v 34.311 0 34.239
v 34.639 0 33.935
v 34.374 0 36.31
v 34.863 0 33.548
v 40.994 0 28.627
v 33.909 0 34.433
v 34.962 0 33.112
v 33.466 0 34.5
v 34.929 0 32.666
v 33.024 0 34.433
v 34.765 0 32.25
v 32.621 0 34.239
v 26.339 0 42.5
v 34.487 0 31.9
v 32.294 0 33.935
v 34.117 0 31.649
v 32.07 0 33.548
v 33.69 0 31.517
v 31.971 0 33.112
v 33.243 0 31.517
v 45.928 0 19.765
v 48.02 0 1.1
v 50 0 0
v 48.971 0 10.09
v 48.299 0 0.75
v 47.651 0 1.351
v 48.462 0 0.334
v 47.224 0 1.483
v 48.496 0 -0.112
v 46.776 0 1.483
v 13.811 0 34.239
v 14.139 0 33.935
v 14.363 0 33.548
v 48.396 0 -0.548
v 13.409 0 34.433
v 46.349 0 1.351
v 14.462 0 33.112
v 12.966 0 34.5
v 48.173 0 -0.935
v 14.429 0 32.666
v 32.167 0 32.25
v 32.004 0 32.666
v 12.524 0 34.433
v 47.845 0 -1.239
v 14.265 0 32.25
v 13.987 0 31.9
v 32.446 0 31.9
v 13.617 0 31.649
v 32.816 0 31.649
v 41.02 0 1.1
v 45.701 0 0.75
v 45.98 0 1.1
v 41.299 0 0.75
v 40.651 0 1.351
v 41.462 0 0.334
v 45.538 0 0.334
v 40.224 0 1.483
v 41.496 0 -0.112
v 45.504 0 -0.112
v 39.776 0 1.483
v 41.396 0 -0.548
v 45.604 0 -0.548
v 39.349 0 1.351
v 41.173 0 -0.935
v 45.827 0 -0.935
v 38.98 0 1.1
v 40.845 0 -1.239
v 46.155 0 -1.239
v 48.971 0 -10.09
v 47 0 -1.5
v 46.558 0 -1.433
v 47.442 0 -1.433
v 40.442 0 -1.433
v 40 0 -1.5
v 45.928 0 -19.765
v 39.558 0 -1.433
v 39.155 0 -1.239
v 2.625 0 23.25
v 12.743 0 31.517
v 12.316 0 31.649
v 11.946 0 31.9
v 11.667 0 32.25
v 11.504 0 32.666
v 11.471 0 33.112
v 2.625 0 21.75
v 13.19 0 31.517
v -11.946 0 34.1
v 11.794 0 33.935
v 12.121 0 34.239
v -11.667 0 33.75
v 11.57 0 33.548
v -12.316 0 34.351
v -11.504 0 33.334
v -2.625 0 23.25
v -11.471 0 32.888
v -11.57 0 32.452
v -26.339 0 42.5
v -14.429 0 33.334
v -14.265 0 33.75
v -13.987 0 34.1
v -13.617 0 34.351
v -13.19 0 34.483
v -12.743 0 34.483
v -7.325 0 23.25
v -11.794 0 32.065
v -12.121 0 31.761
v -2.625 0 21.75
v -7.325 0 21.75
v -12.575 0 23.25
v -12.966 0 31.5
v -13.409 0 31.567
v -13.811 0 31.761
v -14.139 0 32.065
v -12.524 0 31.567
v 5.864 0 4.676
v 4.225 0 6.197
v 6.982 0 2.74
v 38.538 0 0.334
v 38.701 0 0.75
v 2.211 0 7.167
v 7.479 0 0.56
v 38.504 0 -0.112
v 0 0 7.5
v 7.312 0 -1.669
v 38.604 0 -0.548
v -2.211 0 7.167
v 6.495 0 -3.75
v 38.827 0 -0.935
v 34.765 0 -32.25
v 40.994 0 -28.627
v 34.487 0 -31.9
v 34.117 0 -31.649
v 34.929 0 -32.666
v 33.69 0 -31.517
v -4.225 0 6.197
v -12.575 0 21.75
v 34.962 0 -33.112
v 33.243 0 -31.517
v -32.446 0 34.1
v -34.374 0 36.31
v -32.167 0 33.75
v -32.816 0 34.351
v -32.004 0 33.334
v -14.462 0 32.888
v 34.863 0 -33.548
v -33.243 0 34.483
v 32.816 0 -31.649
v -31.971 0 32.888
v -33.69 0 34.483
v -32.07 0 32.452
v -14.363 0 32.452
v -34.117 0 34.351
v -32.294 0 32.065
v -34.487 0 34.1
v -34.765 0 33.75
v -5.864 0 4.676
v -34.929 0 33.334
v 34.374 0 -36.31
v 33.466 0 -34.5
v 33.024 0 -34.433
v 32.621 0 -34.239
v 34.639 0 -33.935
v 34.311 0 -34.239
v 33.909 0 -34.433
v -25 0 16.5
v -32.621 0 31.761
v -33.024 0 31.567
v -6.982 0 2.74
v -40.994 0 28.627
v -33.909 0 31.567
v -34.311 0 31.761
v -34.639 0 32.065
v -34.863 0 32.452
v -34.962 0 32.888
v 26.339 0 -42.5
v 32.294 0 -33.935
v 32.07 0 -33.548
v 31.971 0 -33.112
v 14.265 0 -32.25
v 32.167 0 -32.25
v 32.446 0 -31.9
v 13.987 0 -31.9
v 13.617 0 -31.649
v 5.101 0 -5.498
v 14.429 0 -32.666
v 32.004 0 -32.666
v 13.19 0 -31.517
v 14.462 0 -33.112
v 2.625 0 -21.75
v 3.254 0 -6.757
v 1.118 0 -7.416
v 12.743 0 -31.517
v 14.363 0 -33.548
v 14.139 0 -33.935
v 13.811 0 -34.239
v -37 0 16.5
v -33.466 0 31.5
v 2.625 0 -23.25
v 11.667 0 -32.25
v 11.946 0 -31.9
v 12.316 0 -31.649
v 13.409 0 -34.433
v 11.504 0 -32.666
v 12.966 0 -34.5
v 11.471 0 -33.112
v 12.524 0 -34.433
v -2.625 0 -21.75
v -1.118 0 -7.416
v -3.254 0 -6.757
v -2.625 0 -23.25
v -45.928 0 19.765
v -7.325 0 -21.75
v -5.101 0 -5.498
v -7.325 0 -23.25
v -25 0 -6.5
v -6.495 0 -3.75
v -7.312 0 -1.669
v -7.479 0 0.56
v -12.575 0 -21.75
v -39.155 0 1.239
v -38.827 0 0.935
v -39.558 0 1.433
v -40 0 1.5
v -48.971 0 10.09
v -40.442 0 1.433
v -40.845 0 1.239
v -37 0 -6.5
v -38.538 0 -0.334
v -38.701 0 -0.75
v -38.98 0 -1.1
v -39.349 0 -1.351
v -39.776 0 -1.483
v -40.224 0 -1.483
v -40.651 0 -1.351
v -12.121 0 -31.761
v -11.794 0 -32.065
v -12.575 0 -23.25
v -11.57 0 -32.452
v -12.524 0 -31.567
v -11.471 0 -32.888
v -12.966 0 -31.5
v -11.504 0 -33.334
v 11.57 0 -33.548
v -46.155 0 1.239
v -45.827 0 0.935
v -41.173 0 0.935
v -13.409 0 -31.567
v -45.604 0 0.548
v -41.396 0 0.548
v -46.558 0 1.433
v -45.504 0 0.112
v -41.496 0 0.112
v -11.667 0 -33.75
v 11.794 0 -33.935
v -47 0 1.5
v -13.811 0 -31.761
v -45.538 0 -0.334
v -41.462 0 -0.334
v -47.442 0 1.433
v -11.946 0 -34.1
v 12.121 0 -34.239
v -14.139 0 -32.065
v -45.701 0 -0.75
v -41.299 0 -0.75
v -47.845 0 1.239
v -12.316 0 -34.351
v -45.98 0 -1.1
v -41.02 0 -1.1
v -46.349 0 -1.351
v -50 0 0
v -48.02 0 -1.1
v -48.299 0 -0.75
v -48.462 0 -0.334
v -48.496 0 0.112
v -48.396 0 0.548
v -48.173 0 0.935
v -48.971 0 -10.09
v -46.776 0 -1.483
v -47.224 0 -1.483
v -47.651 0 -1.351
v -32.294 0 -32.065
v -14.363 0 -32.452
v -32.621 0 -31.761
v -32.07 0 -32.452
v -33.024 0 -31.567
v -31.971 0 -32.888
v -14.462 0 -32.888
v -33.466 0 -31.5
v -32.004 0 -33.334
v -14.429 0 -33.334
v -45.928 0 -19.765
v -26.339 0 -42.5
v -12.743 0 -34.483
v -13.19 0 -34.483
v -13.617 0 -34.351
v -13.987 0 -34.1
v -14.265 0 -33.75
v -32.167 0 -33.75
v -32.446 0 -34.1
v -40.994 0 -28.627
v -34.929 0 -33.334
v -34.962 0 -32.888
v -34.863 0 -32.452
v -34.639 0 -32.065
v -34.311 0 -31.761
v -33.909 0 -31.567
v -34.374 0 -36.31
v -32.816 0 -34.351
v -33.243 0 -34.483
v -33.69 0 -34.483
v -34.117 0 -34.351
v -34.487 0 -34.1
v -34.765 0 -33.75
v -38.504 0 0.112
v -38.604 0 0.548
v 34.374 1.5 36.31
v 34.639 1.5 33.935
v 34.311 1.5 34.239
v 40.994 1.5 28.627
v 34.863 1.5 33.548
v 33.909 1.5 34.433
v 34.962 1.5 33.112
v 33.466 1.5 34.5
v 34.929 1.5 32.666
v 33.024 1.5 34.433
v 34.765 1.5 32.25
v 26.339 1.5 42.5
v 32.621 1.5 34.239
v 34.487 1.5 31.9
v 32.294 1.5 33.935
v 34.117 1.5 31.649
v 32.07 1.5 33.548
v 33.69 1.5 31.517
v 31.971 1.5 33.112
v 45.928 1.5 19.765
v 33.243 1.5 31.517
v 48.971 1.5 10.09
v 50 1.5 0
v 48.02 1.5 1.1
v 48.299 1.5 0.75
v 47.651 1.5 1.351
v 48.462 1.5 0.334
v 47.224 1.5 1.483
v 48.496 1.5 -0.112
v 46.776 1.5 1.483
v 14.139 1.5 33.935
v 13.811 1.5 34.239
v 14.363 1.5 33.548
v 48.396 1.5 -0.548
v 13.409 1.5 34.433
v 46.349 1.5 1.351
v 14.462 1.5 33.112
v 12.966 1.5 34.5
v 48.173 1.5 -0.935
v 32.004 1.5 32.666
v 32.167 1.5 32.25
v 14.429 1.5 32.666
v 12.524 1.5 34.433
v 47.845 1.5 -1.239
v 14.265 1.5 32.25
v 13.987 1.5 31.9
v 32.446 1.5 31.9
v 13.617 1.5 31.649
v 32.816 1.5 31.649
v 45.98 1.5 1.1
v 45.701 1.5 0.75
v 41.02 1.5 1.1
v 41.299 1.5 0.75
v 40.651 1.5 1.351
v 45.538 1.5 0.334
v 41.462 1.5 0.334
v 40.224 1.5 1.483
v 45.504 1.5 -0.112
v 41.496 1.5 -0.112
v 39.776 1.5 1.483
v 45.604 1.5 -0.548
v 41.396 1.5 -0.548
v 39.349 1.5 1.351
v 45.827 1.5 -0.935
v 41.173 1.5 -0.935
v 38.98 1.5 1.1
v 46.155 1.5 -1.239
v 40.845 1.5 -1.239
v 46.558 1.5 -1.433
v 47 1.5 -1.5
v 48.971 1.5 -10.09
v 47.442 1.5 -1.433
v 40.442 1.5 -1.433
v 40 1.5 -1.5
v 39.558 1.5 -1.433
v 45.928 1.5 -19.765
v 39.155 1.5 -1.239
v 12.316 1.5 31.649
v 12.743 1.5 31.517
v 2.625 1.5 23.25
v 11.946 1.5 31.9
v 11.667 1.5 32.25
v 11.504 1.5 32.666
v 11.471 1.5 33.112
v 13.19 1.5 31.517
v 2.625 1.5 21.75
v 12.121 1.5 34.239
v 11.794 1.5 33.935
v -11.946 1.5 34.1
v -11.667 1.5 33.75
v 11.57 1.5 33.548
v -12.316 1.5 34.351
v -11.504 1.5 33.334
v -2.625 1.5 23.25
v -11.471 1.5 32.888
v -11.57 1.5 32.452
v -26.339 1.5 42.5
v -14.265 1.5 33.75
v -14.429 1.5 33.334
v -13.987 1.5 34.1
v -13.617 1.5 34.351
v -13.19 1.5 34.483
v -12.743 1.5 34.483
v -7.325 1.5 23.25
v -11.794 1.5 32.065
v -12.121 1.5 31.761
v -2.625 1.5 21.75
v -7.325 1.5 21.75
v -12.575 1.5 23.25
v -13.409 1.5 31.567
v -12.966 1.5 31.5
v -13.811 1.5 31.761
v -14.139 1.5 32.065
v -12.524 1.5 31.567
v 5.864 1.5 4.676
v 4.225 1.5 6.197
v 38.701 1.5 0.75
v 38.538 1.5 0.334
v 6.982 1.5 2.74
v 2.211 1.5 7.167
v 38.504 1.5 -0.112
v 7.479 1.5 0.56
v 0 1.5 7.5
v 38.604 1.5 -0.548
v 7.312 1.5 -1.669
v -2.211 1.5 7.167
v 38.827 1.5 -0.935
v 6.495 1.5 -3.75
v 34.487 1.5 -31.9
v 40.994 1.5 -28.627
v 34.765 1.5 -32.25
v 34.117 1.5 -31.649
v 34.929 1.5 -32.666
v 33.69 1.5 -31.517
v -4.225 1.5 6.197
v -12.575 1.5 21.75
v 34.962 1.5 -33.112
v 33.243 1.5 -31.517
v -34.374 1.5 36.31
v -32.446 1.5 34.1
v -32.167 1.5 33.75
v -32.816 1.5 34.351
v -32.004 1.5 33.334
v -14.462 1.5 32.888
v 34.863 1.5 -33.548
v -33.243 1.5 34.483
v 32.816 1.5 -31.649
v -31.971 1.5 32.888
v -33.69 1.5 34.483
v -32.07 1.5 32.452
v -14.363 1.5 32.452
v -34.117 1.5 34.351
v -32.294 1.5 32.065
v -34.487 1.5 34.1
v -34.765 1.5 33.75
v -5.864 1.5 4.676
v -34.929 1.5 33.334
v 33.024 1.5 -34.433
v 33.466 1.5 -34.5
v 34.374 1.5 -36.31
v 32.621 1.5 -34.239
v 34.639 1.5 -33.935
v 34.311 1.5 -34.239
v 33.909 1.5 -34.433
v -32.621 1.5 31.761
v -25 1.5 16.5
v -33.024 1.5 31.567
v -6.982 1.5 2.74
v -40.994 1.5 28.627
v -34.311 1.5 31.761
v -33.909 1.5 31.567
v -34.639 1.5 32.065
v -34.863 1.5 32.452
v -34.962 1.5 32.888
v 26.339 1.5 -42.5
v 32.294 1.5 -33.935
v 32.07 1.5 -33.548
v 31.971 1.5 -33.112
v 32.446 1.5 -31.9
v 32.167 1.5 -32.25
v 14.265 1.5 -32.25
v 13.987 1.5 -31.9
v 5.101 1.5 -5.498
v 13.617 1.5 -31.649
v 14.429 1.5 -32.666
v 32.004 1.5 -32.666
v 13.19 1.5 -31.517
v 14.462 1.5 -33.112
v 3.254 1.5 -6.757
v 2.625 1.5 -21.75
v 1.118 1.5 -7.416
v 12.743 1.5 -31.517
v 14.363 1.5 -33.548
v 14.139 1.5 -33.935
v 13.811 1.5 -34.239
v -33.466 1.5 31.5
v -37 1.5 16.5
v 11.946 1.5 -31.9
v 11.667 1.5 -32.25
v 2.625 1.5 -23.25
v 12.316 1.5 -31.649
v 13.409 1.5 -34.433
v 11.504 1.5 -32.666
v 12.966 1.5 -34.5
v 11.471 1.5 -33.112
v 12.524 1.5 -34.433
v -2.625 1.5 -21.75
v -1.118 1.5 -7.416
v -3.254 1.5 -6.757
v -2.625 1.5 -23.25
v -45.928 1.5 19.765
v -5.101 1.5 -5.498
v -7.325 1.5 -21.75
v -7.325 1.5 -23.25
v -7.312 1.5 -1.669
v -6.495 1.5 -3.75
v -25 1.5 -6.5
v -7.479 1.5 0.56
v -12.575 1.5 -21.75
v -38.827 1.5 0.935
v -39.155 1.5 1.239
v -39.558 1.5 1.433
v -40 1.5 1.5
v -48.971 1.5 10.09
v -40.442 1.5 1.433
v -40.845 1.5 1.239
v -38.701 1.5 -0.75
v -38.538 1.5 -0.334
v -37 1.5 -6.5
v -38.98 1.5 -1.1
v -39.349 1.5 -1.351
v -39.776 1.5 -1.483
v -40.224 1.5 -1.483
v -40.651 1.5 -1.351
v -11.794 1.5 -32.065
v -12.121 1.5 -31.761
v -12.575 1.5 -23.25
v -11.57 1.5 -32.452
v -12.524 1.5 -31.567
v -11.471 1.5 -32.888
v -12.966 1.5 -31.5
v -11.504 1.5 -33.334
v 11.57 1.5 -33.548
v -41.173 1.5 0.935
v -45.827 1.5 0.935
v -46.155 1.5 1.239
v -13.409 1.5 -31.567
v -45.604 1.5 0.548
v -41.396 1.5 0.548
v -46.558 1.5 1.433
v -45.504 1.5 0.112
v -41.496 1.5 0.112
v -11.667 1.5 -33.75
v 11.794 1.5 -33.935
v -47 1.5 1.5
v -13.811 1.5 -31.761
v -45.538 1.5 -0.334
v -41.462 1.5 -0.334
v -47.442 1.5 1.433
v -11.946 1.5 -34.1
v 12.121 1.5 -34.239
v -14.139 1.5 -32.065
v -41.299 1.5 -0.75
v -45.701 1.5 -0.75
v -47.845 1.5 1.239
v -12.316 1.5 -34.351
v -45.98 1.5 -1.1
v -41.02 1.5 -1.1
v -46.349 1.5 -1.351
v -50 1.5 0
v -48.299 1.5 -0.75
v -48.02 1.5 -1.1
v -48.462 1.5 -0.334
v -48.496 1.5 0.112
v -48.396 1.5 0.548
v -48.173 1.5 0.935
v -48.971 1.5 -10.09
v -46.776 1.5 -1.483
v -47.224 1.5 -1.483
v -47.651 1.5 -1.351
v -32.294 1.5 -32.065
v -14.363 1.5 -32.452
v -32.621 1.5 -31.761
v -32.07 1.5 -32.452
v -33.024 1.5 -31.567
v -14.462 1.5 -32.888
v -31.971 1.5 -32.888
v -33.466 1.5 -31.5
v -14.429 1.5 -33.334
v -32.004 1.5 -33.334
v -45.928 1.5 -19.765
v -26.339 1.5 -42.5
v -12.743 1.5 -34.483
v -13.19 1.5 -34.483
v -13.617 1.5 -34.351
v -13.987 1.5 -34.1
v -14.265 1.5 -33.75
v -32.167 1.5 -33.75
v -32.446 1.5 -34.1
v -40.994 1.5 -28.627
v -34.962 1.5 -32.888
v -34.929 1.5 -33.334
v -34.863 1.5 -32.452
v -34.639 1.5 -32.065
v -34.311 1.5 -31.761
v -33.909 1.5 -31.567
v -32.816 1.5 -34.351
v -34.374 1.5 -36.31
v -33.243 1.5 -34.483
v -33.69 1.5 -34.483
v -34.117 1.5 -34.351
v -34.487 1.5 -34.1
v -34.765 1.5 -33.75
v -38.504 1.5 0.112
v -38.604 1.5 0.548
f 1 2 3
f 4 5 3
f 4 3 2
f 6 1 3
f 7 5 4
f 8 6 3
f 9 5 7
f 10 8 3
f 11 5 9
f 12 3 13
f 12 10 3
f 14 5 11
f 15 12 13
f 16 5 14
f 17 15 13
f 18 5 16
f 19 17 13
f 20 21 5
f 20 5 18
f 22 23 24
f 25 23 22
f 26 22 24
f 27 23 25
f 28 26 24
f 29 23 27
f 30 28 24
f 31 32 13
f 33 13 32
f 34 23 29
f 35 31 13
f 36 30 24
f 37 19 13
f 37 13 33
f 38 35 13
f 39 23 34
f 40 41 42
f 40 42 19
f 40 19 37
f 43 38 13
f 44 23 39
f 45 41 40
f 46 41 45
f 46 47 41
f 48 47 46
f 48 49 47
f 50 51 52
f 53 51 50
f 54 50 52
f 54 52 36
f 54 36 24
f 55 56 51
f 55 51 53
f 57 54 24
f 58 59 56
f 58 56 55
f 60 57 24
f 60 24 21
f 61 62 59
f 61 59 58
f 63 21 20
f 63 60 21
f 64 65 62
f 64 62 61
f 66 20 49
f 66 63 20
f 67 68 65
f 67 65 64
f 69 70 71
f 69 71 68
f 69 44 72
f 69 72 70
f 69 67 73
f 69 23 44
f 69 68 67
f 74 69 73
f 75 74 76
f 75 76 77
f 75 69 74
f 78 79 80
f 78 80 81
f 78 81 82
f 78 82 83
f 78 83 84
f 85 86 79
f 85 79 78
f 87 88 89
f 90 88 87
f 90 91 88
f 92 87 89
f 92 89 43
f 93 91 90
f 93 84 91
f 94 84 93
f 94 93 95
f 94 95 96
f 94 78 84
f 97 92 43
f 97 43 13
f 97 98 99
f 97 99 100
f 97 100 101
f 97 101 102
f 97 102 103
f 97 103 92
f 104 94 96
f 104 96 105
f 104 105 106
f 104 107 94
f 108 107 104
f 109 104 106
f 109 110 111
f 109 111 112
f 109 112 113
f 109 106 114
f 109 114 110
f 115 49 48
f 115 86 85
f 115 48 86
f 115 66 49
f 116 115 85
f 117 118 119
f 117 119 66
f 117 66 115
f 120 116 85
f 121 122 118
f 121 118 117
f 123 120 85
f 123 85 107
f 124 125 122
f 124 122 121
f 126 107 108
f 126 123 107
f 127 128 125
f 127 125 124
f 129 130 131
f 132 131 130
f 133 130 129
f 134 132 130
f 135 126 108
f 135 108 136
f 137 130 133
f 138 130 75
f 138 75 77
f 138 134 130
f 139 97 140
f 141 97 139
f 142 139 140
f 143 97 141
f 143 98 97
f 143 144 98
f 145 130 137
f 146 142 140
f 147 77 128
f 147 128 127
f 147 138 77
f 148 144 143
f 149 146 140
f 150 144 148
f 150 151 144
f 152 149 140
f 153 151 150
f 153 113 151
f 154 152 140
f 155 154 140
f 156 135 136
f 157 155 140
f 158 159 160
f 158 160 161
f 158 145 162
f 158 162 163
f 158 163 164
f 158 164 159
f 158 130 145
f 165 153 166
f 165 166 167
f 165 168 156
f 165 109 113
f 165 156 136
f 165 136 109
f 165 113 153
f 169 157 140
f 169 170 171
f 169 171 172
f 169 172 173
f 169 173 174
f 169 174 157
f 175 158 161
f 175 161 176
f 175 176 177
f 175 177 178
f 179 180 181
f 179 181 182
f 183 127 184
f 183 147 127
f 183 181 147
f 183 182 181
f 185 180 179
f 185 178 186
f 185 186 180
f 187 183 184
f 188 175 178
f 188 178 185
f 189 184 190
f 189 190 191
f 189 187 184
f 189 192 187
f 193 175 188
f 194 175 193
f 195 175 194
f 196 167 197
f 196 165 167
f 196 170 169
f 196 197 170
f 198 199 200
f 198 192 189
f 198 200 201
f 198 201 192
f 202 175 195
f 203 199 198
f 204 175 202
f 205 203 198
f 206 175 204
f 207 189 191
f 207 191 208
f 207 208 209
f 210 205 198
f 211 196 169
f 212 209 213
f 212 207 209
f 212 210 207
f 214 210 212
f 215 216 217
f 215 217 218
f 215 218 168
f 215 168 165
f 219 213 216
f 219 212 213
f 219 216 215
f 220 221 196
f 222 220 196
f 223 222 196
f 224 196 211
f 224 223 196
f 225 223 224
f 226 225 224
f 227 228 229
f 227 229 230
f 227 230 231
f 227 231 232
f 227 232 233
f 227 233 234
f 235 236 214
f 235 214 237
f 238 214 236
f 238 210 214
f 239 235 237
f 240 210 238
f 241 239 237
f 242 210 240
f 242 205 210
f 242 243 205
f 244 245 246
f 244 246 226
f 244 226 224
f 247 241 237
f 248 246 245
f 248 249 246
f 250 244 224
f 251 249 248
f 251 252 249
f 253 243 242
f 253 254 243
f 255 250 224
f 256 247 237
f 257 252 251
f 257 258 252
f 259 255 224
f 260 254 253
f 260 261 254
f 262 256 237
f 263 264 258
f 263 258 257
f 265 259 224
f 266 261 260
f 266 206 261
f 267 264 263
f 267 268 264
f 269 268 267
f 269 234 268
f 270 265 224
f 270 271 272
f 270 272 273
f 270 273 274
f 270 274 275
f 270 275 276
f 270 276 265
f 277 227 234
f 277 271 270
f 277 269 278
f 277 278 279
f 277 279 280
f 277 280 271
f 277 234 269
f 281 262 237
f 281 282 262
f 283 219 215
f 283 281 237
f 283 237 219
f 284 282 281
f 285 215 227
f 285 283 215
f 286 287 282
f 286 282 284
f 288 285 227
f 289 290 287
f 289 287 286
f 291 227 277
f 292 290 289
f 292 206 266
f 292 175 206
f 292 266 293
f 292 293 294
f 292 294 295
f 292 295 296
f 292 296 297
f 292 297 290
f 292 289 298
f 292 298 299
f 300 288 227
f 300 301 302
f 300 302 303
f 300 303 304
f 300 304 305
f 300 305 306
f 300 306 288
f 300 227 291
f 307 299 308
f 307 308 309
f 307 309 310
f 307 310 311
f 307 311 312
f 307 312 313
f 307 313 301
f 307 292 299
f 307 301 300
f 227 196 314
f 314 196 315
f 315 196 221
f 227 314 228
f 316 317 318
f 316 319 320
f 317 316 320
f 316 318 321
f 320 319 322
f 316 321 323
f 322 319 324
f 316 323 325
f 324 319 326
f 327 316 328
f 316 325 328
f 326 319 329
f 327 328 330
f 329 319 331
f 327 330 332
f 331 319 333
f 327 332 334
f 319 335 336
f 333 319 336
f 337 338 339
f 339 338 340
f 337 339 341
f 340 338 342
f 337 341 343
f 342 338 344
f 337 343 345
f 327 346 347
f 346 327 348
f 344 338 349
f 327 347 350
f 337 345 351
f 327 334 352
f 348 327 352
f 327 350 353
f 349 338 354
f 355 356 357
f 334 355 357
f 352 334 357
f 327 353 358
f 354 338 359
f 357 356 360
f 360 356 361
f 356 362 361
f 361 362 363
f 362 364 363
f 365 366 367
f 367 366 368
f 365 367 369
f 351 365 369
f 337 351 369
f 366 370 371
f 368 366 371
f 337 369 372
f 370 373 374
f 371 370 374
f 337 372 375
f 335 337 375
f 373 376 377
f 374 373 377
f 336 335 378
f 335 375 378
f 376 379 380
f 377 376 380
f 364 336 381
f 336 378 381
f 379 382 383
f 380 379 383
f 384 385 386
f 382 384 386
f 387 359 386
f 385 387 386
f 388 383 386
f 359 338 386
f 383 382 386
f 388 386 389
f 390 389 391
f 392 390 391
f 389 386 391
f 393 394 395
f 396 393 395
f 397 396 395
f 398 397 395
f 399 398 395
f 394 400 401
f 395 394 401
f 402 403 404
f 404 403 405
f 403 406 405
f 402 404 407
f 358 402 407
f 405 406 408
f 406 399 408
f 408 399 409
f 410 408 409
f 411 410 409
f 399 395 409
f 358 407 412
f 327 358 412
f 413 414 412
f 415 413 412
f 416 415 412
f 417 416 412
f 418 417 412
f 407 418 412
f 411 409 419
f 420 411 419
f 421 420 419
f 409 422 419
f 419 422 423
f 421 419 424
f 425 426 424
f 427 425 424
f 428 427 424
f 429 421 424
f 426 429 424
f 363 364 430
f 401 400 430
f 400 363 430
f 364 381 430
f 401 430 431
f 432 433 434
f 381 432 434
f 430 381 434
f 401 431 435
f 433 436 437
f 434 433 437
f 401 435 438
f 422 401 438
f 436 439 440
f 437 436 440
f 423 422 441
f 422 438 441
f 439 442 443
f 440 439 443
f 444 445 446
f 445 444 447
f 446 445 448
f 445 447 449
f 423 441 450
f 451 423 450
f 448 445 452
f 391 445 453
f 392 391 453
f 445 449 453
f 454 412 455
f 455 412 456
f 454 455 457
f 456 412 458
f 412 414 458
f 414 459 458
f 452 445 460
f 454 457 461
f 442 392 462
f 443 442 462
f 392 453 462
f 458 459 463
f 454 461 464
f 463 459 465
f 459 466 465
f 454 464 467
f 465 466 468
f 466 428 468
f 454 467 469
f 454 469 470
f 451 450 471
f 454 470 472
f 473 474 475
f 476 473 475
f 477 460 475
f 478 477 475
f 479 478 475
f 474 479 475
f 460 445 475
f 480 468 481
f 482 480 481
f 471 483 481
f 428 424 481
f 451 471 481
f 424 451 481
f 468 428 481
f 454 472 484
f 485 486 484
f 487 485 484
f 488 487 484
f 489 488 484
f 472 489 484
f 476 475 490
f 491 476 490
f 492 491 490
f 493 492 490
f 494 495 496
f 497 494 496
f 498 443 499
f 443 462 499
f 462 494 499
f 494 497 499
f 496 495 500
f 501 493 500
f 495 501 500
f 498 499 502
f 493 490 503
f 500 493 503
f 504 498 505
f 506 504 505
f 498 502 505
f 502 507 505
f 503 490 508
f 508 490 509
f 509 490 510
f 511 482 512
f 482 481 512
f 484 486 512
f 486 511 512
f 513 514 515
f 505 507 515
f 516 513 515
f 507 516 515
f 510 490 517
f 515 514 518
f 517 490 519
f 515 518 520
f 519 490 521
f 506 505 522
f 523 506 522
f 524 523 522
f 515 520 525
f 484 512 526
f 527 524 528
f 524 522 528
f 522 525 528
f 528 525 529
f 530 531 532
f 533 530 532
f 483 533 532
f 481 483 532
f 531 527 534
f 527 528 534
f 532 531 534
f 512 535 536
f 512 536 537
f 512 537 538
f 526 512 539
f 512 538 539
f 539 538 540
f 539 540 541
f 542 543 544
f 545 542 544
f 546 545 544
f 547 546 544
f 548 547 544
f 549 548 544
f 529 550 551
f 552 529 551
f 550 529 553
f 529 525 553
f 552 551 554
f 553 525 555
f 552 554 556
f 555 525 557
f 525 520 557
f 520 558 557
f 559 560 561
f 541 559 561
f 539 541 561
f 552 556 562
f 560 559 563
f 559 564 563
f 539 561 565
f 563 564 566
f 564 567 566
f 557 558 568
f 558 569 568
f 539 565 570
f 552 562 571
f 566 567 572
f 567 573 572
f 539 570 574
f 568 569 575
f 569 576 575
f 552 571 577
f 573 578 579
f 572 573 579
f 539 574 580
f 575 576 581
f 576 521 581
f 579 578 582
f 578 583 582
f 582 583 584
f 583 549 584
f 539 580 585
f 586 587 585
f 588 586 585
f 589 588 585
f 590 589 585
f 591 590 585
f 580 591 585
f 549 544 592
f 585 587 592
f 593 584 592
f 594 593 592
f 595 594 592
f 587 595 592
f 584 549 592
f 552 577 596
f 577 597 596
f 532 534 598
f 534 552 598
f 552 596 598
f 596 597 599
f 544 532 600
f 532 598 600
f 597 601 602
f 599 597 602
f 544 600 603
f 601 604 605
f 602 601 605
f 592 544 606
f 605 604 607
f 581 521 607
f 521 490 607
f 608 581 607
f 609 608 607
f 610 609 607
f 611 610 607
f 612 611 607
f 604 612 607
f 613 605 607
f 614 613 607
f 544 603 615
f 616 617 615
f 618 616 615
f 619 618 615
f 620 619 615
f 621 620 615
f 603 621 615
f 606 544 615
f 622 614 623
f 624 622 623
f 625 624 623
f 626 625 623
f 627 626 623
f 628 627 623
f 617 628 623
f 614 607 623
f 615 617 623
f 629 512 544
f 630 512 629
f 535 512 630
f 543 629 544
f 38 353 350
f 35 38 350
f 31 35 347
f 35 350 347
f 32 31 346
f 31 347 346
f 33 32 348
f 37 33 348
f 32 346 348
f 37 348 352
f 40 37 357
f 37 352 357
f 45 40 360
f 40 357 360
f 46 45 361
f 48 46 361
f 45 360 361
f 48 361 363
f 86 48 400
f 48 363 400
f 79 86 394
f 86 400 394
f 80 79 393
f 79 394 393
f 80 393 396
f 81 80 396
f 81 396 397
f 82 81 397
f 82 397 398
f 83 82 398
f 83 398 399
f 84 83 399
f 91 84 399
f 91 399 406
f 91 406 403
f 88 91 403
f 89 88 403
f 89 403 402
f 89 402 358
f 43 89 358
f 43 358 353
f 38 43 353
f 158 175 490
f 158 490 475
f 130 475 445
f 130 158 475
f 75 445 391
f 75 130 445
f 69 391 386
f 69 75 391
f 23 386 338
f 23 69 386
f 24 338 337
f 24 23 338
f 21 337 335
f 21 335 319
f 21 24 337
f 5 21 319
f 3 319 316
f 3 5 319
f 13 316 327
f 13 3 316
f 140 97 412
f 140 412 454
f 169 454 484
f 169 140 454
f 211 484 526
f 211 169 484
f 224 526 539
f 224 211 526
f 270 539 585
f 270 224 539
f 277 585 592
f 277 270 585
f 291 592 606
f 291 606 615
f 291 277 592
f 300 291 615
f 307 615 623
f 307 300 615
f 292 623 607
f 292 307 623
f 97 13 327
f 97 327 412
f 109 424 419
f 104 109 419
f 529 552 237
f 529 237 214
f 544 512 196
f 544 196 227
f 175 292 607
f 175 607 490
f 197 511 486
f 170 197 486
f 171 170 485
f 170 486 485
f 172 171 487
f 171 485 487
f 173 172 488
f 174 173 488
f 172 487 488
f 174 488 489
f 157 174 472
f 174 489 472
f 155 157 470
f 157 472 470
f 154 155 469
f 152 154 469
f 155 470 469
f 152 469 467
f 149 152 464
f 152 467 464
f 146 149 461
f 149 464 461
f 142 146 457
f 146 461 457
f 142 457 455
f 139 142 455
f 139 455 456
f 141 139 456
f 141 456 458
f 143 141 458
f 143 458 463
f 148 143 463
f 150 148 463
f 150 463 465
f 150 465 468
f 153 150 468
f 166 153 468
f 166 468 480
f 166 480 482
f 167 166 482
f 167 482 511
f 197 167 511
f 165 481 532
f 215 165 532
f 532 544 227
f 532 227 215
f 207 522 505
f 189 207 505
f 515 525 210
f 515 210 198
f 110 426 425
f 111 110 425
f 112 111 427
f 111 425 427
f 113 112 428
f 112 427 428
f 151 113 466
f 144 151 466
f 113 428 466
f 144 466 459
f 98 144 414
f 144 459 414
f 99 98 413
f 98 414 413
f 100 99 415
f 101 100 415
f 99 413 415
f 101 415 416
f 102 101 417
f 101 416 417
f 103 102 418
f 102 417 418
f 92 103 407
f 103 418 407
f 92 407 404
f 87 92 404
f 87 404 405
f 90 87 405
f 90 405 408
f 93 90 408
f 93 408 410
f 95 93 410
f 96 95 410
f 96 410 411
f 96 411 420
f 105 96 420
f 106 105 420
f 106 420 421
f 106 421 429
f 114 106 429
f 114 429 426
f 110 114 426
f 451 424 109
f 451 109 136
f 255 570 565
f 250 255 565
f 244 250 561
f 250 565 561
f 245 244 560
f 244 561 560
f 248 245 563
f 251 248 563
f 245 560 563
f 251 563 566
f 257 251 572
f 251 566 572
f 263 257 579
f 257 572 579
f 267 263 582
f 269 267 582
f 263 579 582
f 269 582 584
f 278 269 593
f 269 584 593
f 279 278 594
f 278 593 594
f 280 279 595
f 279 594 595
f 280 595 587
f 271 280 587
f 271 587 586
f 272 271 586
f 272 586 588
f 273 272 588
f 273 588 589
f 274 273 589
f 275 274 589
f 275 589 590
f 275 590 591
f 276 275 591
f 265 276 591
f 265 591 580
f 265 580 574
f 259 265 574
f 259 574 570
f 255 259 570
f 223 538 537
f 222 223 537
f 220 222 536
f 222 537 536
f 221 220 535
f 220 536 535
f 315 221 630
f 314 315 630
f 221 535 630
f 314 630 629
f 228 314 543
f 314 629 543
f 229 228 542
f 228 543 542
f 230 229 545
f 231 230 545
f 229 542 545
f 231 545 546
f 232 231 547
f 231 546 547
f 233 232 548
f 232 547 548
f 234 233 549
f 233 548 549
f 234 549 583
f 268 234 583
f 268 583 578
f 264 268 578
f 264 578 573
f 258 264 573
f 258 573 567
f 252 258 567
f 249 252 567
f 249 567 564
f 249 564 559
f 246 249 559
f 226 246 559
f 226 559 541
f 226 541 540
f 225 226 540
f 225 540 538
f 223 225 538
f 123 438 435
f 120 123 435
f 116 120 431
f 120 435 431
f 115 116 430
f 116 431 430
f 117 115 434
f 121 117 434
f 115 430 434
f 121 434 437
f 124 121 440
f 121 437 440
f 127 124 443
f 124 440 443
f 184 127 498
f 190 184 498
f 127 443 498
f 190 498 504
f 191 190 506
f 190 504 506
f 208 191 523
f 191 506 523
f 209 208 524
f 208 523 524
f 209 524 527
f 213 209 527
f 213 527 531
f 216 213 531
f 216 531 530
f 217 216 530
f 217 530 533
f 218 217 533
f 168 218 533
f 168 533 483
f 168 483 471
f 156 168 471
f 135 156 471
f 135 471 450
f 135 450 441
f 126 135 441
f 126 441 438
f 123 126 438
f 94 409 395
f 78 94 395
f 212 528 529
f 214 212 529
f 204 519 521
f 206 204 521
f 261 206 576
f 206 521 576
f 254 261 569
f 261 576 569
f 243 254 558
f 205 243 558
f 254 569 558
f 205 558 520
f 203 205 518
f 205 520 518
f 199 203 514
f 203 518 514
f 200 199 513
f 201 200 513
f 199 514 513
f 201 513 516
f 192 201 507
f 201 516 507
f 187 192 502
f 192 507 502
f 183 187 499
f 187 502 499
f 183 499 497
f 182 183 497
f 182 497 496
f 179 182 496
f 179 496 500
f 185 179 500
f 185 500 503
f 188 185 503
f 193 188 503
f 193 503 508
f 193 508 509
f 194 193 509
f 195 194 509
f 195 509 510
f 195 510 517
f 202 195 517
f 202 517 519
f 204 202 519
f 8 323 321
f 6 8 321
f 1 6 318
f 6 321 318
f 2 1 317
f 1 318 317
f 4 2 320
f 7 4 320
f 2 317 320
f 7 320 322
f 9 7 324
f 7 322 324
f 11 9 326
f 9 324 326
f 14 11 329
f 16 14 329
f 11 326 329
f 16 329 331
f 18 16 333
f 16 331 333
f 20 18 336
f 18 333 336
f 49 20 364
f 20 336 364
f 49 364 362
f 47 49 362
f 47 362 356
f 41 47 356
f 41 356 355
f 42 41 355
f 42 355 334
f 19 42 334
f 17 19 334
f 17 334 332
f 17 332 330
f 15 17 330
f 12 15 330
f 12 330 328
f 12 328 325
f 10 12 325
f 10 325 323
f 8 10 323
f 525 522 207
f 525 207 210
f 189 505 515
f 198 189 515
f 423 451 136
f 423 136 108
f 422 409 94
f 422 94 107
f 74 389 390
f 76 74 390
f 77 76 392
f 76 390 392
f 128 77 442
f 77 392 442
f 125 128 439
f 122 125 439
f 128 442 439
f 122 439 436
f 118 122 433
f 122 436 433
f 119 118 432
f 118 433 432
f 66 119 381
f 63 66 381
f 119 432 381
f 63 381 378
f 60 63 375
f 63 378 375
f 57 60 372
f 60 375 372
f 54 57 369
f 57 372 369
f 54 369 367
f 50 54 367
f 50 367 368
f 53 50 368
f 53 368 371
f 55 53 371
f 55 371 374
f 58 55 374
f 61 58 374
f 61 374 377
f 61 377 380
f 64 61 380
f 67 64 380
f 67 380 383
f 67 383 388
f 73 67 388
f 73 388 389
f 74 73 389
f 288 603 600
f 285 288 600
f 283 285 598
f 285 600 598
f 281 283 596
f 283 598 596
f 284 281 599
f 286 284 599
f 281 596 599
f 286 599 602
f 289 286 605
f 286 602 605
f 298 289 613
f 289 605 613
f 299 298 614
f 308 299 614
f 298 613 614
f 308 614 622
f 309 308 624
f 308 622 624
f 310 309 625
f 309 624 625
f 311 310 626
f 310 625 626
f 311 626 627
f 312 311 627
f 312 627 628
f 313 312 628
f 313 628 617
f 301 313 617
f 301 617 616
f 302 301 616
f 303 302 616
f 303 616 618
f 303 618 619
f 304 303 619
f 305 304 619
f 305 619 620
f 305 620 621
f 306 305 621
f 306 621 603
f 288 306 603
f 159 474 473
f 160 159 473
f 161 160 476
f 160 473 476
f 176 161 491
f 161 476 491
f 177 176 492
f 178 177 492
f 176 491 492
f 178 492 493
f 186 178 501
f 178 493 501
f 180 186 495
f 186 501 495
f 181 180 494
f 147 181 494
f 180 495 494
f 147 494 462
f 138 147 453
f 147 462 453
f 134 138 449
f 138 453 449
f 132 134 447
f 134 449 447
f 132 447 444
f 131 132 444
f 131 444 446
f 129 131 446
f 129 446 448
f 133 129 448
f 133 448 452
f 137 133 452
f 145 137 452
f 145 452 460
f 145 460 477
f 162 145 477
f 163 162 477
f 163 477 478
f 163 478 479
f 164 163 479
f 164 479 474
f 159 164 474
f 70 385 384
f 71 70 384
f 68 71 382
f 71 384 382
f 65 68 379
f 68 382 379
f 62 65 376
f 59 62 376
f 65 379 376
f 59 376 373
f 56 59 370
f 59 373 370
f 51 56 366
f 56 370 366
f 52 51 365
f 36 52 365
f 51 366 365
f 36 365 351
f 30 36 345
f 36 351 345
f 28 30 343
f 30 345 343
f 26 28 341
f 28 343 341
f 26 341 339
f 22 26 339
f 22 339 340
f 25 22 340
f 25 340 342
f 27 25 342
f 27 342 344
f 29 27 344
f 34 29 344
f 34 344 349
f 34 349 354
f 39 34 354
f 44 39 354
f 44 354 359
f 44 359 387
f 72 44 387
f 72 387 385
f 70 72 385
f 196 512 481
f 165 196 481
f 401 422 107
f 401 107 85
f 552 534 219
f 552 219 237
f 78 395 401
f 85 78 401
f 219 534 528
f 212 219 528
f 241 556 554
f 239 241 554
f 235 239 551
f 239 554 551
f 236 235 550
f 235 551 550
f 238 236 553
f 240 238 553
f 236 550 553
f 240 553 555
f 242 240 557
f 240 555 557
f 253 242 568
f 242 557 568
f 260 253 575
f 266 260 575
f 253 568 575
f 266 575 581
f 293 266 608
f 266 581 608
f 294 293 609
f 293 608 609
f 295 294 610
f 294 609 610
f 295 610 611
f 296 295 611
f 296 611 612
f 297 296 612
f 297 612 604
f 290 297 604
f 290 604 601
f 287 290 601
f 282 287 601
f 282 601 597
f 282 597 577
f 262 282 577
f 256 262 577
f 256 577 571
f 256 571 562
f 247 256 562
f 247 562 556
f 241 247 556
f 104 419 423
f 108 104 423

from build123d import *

# Parameters (mm, degrees)
BOSS_EXTRUDE1_DEPTH = 1.5
SKETCH3_R           = 7.5
SKETCH3_R_2         = 1.5
SKETCH3_W           = 12
SKETCH3_H           = 23
SKETCH3_W_2         = 5.25
SKETCH3_H_2         = 1.5
CUT_EXTRUDE1_DEPTH  = 66.639165138


with BuildPart() as part:
    # Sketch2 → Boss-Extrude1 (new body)
    with BuildSketch(Plane(origin=(0, 0, 0), x_dir=(1, 0, 0), z_dir=(0, 1, 0))):
        with BuildLine():
            Line((-26.339134382, 42.5), (26.339134382, 42.5))
            ThreePointArc((26.339134382, 42.5), (50, 0), (26.339134382, -42.5))
            Line((26.339134382, -42.5), (-26.339134382, -42.5))
            ThreePointArc((-26.339134382, -42.5), (-50, 0), (-26.339134382, 42.5))
        make_face()
    extrude(amount=BOSS_EXTRUDE1_DEPTH)

    # Sketch3 → Cut-Extrude1 (cut, through all)
    with BuildSketch(Plane(origin=(0, 1.5, 0), x_dir=(1, 0, 0), z_dir=(0, 1, 0))):
        with Locations(Location((0, 0, 0), (0, 0, 270))):
            Circle(SKETCH3_R)
        with Locations(Location((-47, 0, 0), (0, 0, 270))):
            Circle(SKETCH3_R_2)
        with Locations(Location((-33.466401061, 33, 0), (0, 0, 270))):
            Circle(SKETCH3_R_2)
        with Locations(Location((-12.966401061, 33, 0), (0, 0, 270))):
            Circle(SKETCH3_R_2)
        with Locations(Location((-40, 0, 0), (0, 0, 270))):
            Circle(SKETCH3_R_2)
        with Locations(Location((-12.966401061, -33, 0), (0, 0, 90))):
            Circle(SKETCH3_R_2)
        with Locations(Location((-33.466401061, -33, 0), (0, 0, 90))):
            Circle(SKETCH3_R_2)
        with Locations(Location((33.466401061, 33, 0), (0, 0, 90))):
            Circle(SKETCH3_R_2)
        with Locations(Location((12.966401061, 33, 0), (0, 0, 90))):
            Circle(SKETCH3_R_2)
        with Locations(Location((12.966401061, -33, 0), (0, 0, 270))):
            Circle(SKETCH3_R_2)
        with Locations(Location((33.466401061, -33, 0), (0, 0, 270))):
            Circle(SKETCH3_R_2)
        with Locations(Location((40, 0, 0), (0, 0, 90))):
            Circle(SKETCH3_R_2)
        with Locations(Location((47, 0, 0), (0, 0, 90))):
            Circle(SKETCH3_R_2)
        with Locations((-31, -5)):
            Rectangle(SKETCH3_W, SKETCH3_H)
        with Locations((0, -22.5)):
            Rectangle(SKETCH3_W_2, SKETCH3_H_2)
        with Locations((-9.95, 22.5)):
            Rectangle(SKETCH3_W_2, SKETCH3_H_2)
        with Locations((0, 22.5)):
            Rectangle(SKETCH3_W_2, SKETCH3_H_2)
        with Locations((-9.95, -22.5)):
            Rectangle(SKETCH3_W_2, SKETCH3_H_2)
    extrude(amount=-CUT_EXTRUDE1_DEPTH, mode=Mode.SUBTRACT)


solid = part.part
